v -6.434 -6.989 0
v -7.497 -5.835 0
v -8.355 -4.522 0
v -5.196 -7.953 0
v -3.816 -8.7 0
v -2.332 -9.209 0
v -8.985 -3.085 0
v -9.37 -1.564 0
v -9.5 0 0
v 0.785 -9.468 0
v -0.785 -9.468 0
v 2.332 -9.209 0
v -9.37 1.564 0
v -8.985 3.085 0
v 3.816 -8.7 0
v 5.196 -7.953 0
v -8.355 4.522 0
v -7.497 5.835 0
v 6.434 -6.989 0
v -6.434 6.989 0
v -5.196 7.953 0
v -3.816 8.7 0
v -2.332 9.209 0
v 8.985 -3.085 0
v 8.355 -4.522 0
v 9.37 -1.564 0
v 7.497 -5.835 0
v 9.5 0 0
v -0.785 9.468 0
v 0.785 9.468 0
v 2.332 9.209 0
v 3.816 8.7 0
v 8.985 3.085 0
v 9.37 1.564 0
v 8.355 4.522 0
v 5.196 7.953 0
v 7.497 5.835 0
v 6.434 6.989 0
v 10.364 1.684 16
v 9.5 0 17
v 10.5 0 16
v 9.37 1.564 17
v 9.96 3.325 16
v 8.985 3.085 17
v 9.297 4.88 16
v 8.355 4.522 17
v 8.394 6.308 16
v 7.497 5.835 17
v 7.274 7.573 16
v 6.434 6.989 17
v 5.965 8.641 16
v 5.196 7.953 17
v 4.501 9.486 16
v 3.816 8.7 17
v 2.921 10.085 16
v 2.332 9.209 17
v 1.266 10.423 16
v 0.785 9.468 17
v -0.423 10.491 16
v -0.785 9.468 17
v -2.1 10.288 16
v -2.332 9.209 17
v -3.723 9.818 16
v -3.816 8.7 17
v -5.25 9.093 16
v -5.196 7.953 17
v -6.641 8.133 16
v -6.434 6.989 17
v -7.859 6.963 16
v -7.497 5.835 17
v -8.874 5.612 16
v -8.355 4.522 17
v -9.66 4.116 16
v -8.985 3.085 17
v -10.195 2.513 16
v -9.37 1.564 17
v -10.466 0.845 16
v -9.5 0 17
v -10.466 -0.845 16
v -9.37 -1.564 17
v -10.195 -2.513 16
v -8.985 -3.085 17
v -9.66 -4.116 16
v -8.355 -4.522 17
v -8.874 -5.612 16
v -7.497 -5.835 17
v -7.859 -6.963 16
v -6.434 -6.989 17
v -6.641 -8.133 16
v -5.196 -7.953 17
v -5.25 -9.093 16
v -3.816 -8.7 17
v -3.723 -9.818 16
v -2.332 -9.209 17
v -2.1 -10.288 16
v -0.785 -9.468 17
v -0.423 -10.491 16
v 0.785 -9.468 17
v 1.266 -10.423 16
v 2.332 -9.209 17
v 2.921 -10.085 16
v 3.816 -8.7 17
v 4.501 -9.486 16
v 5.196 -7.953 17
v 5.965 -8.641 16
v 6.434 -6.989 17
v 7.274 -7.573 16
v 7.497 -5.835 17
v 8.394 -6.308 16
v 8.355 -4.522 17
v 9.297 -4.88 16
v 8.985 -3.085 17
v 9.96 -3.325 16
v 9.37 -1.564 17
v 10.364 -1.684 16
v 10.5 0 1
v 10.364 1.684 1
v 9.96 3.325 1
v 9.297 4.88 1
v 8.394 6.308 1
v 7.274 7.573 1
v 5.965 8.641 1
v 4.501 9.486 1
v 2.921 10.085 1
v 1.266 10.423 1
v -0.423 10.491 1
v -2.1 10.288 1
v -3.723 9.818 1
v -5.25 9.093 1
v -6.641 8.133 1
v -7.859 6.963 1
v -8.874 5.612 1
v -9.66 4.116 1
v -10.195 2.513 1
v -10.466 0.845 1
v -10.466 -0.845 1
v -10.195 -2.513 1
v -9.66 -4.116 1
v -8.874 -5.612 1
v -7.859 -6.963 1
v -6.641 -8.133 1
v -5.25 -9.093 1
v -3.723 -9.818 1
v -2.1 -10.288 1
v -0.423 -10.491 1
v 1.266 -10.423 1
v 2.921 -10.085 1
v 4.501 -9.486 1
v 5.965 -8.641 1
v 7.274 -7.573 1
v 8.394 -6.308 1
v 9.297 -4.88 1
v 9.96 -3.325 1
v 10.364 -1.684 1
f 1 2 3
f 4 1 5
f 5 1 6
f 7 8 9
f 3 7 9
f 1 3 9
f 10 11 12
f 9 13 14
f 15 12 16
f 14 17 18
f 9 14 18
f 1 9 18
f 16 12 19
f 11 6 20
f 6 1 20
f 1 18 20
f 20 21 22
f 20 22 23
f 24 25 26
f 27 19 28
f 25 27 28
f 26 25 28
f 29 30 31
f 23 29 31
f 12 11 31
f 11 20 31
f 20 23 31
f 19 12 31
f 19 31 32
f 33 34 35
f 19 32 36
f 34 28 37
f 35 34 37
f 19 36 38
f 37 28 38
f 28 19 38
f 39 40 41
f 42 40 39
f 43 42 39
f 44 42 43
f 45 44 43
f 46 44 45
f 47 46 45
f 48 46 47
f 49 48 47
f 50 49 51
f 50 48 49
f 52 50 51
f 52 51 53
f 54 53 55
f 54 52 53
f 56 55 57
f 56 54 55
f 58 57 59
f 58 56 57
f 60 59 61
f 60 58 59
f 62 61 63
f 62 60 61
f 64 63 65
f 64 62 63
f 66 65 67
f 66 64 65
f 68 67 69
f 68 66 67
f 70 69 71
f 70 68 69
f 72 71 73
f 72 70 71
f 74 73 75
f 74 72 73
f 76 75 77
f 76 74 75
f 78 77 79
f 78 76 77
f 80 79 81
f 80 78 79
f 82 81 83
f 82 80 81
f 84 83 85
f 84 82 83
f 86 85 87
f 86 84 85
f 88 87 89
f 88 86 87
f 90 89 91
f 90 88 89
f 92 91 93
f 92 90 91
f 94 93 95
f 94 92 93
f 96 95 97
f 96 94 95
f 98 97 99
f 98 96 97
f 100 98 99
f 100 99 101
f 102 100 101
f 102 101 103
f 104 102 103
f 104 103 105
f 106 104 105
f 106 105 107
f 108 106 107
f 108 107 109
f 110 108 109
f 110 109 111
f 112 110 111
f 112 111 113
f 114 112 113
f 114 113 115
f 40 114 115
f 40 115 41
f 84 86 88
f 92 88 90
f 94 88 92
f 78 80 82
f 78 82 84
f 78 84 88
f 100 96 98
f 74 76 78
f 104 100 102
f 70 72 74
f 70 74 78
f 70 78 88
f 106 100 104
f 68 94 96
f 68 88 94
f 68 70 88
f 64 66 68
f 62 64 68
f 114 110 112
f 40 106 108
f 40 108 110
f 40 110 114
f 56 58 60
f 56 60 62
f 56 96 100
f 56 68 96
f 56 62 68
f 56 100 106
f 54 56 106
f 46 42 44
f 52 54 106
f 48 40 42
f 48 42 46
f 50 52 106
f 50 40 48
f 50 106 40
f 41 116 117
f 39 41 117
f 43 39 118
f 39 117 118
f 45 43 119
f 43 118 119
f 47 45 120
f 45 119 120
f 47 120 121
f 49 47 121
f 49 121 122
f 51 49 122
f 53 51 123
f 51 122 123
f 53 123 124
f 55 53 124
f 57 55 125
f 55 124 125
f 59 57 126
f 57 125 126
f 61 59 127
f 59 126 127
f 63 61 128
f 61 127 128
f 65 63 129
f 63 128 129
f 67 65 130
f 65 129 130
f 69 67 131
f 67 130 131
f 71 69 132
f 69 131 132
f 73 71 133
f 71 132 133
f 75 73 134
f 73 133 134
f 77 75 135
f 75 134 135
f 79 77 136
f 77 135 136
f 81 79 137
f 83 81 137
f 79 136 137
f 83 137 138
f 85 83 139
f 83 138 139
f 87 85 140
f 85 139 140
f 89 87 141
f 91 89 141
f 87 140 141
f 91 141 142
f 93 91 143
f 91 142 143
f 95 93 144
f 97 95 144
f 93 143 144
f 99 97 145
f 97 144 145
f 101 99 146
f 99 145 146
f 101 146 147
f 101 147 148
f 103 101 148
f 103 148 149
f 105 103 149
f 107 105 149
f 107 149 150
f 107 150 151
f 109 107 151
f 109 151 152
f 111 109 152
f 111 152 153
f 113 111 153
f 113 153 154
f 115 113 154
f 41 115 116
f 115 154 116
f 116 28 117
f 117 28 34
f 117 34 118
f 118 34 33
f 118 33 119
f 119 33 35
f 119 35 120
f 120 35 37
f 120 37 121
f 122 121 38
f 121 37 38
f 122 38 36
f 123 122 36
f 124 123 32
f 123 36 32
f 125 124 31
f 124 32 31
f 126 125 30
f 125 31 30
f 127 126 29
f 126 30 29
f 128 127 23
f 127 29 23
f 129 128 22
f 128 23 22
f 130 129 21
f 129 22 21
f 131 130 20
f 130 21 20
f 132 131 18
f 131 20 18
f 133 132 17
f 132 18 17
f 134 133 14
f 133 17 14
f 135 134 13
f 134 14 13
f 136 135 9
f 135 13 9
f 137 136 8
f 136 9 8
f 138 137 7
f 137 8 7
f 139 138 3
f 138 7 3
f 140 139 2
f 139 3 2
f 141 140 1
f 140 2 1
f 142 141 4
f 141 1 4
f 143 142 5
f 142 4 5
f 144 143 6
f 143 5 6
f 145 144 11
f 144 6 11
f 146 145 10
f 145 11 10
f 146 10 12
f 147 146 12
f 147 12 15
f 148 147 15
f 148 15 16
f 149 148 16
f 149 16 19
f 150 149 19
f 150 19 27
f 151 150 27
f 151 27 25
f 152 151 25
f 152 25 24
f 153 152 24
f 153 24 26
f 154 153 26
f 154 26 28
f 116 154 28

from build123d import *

# Parameters (mm, degrees)
SKETCH_R        = 10.5
PAD_DEPTH       = 17
CHAMFER_SIZE    = 1
CHAMFER001_SIZE = 1


with BuildPart() as part:
    # Sketch → Pad (new body)
    with BuildSketch(Plane.XY):
        Circle(SKETCH_R)
    extrude(amount=PAD_DEPTH)

    # Chamfer
    chamfer_edges = [part.edges().sort_by_distance(p)[0] for p in [
        (-10.5, 0, 17),
    ]]
    chamfer(chamfer_edges, length=CHAMFER_SIZE)

    # Chamfer001
    chamfer001_edges = [part.edges().sort_by_distance(p)[0] for p in [
        (-10.5, 0, 0),
    ]]
    chamfer(chamfer001_edges, length=CHAMFER001_SIZE)


solid = part.part
